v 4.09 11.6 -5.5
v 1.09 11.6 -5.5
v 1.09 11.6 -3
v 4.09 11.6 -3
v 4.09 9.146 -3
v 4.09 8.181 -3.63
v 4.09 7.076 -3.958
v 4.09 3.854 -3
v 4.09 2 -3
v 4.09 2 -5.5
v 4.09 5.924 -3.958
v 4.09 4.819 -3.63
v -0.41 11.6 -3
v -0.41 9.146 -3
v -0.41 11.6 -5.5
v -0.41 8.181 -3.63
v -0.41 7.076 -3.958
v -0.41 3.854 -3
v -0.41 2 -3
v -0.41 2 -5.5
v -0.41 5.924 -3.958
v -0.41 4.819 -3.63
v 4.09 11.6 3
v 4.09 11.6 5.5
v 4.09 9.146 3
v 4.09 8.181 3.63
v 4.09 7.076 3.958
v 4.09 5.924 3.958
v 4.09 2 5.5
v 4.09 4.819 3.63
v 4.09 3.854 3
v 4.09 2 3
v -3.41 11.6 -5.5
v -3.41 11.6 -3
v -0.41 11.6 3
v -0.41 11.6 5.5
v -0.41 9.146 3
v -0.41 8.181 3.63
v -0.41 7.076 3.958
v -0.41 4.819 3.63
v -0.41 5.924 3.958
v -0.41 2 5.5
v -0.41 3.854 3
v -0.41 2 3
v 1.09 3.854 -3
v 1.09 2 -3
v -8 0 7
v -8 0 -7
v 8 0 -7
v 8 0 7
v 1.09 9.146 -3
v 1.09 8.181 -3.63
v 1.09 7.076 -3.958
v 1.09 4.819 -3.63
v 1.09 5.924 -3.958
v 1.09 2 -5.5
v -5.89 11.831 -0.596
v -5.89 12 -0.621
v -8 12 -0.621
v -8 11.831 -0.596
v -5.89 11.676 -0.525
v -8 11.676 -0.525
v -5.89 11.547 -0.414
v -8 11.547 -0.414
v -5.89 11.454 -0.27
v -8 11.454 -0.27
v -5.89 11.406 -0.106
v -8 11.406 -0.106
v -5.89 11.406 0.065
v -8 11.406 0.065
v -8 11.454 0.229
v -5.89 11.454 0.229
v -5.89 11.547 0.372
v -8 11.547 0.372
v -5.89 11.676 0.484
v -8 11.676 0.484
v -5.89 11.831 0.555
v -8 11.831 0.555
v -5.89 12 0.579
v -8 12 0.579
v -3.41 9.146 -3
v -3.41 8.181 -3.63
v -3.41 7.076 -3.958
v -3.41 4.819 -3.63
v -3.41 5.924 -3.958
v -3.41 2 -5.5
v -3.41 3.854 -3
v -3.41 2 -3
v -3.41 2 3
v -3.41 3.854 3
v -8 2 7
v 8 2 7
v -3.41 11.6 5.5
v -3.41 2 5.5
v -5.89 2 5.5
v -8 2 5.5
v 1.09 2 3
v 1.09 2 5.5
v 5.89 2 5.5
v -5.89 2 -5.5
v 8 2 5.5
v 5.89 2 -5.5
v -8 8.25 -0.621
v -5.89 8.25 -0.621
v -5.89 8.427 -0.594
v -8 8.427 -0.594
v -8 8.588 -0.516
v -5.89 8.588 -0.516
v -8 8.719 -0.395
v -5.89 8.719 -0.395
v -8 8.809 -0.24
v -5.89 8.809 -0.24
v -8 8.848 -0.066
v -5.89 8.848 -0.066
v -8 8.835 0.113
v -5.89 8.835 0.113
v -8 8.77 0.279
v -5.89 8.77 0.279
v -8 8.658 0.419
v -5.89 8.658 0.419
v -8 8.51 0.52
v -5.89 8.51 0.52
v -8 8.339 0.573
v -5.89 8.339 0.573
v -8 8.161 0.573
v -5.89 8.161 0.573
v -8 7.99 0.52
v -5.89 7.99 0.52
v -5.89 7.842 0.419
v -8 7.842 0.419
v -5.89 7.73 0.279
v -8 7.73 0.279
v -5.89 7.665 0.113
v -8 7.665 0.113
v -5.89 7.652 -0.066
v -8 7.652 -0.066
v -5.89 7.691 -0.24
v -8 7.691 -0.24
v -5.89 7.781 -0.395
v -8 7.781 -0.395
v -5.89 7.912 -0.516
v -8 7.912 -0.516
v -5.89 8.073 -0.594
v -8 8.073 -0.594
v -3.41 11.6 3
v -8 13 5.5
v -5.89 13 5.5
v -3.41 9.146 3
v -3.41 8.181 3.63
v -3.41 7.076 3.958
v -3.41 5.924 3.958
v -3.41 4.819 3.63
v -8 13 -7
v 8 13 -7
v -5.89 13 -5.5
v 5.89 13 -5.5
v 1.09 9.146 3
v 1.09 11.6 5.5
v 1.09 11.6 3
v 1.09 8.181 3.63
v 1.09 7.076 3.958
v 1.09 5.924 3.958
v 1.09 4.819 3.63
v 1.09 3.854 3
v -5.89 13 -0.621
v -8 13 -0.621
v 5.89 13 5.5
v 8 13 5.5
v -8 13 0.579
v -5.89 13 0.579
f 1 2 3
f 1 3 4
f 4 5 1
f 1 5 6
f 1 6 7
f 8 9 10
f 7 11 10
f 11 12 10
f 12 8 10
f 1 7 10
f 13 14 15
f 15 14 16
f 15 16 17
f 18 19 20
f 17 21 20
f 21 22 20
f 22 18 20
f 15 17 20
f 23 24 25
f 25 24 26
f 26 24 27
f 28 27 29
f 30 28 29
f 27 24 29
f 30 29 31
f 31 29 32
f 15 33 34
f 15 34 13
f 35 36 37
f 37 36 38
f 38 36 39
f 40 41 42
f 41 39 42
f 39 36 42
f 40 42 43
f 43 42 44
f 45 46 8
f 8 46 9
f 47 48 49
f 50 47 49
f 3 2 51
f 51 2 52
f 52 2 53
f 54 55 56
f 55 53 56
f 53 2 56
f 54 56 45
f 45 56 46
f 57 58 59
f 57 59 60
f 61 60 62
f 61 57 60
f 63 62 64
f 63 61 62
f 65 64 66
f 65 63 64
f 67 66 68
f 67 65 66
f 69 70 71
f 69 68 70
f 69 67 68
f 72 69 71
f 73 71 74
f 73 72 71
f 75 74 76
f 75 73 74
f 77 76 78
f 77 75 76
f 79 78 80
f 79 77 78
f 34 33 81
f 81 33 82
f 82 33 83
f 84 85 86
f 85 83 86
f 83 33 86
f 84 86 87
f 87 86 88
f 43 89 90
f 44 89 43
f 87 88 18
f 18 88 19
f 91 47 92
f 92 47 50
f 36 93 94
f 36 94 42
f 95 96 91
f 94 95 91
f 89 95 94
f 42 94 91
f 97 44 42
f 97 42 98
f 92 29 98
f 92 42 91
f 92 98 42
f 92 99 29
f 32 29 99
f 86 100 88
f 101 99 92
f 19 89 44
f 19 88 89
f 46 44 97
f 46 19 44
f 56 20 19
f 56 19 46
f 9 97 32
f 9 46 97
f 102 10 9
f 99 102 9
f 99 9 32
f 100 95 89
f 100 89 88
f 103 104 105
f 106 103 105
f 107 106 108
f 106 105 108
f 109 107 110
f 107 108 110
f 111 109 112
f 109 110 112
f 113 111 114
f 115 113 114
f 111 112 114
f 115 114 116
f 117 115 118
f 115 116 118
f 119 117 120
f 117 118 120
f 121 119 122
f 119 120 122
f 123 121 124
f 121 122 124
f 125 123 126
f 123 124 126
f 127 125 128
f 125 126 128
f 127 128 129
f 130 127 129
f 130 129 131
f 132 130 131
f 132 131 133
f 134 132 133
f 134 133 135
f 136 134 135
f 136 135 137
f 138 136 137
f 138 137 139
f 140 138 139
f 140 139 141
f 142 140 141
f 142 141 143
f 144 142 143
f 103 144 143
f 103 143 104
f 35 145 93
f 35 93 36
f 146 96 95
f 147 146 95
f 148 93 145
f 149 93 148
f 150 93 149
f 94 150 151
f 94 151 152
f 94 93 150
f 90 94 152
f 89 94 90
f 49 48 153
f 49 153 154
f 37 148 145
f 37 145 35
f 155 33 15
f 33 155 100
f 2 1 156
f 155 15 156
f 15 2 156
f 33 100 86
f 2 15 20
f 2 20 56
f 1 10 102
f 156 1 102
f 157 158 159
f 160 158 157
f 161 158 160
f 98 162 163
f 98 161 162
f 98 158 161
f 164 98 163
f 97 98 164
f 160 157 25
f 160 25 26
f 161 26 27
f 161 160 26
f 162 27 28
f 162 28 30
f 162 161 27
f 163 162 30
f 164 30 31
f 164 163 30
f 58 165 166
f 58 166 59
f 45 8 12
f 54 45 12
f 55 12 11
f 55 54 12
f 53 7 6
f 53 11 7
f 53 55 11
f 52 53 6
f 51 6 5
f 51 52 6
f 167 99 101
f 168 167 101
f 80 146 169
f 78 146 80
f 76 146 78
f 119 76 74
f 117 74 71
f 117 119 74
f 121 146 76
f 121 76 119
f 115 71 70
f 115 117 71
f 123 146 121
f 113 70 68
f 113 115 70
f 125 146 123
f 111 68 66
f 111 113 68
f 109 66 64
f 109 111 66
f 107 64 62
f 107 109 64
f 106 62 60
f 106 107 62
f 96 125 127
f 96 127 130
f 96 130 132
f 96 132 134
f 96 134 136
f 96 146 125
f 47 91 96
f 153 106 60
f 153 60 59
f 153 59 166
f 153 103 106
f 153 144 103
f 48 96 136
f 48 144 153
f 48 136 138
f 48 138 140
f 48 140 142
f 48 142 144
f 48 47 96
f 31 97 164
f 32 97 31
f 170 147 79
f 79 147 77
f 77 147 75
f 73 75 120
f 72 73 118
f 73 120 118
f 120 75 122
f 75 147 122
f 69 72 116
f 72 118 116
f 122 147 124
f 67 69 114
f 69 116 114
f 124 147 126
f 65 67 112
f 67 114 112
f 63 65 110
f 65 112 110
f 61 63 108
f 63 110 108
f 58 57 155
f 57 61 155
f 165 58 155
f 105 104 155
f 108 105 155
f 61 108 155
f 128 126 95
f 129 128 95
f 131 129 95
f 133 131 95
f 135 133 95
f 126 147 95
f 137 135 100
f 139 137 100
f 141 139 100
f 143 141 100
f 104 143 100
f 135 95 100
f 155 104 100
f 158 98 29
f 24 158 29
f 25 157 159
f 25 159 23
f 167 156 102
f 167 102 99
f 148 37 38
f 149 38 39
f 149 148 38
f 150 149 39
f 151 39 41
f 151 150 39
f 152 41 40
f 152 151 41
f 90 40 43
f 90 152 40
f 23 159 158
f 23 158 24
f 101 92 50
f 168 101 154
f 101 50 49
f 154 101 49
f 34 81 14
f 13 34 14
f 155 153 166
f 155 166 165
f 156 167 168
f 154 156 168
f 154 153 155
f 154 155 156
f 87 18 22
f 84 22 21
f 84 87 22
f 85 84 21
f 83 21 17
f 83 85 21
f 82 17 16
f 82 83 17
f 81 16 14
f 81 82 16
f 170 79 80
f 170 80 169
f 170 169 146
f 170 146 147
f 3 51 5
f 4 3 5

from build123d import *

# Parameters (mm, degrees)
CROQUIS1_W              = 16
CROQUIS1_H              = 14
SALIENTE_EXTRUIR1_DEPTH = 2
CROQUIS2_W              = 3
CROQUIS2_H              = 2.5
SALIENTE_EXTRUIR2_DEPTH = 13
CROQUIS4_W              = 3
CROQUIS4_H              = 2.5
CORTAR_EXTRUIR1_DEPTH   = 1.4
CORTAR_EXTRUIR2_START   = 2.480005
CROQUIS5_R              = 4
CORTAR_EXTRUIR2_DEPTH   = 7.5
CROQUIS7_2_R            = 0.6
CORTAR_EXTRUIR4_DEPTH   = 5
CROQUIS7_R              = 0.6
CORTAR_EXTRUIR3_DEPTH   = 4


with BuildPart() as part:
    # Croquis1 → Saliente-Extruir1 (new body)
    with BuildSketch(Plane(origin=(0, 0, 0), x_dir=(1, 0, 0), z_dir=(0, 1, 0))):
        Rectangle(CROQUIS1_W, CROQUIS1_H)
    extrude(amount=SALIENTE_EXTRUIR1_DEPTH)

    # Croquis2 → Saliente-Extruir2 (add)
    with BuildSketch(Plane(origin=(0, 0, 0), x_dir=(1, 0, 0), z_dir=(0, 1, 0))):
        Polygon((5.890002582, 5.5), (5.890002582, -5.5), (8, -5.5), (8, 7), (-8, 7), (-8, -5.5), (-5.890002582, -5.5), (-5.890002582, 5.5), (-3.409997418, 5.5), (-3.409997418, 3), (-0.409997418, 3), (-0.409997418, 5.5), (1.090002582, 5.5), (1.090002582, 3), (4.090002582, 3), (4.090002582, 5.5), align=None)
        with Locations((-1.909997418, -4.25)):
            Rectangle(CROQUIS2_W, CROQUIS2_H)
        with Locations((2.590002582, -4.25)):
            Rectangle(CROQUIS2_W, CROQUIS2_H)
    extrude(amount=SALIENTE_EXTRUIR2_DEPTH)

    # Croquis4 → Cortar-Extruir1 (cut)
    with BuildSketch(Plane(origin=(0, 13, 0), x_dir=(1, 0, 0), z_dir=(0, 1, 0))):
        with Locations((-1.909997418, -4.25)):
            Rectangle(CROQUIS4_W, CROQUIS4_H)
        with Locations((2.590002582, -4.25)):
            Rectangle(CROQUIS4_W, CROQUIS4_H)
        with Locations((2.590002582, 4.25)):
            Rectangle(CROQUIS4_W, CROQUIS4_H)
        with Locations((-1.909997418, 4.25)):
            Rectangle(CROQUIS4_W, CROQUIS4_H)
    extrude(amount=-CORTAR_EXTRUIR1_DEPTH, mode=Mode.SUBTRACT)

    # Croquis5 → Cortar-Extruir2 (cut)
    with BuildSketch(Plane(origin=(-5.890002582, 0, 0), x_dir=(0, 0, -1), z_dir=(1, 0, 0)).offset(CORTAR_EXTRUIR2_START)):
        with Locations((0, 6.5)):
            Circle(CROQUIS5_R)
    extrude(amount=CORTAR_EXTRUIR2_DEPTH, mode=Mode.SUBTRACT)

    # Croquis7<2> → Cortar-Extruir4 (cut)
    with BuildSketch(Plane(origin=(-5.890002582, 0, 0), x_dir=(0, 0, -1), z_dir=(1, 0, 0))):
        with Locations((0.020682753, 8.25)):
            Circle(CROQUIS7_2_R)
        with BuildLine():
            Line((-0.579317247, 12), (-0.579317247, 13))
            Line((-0.579317247, 13), (0.620682753, 13))
            Line((0.620682753, 13), (0.620682753, 12))
            ThreePointArc((0.620682753, 12), (0.020682753, 11.4), (-0.579317247, 12))
        make_face()
    extrude(amount=-CORTAR_EXTRUIR4_DEPTH, mode=Mode.SUBTRACT)

    # Croquis7 → Cortar-Extruir3 (cut)
    with BuildSketch(Plane(origin=(-5.890002582, 0, 0), x_dir=(0, 0, -1), z_dir=(1, 0, 0))):
        with Locations((0.020682753, 8.25)):
            Circle(CROQUIS7_R)
        with BuildLine():
            Line((-0.579317247, 12), (-0.579317247, 13))
            Line((-0.579317247, 13), (0.620682753, 13))
            Line((0.620682753, 13), (0.620682753, 12))
            ThreePointArc((0.620682753, 12), (0.020682753, 11.4), (-0.579317247, 12))
        make_face()
    extrude(amount=-CORTAR_EXTRUIR3_DEPTH, mode=Mode.SUBTRACT)


solid = part.part
